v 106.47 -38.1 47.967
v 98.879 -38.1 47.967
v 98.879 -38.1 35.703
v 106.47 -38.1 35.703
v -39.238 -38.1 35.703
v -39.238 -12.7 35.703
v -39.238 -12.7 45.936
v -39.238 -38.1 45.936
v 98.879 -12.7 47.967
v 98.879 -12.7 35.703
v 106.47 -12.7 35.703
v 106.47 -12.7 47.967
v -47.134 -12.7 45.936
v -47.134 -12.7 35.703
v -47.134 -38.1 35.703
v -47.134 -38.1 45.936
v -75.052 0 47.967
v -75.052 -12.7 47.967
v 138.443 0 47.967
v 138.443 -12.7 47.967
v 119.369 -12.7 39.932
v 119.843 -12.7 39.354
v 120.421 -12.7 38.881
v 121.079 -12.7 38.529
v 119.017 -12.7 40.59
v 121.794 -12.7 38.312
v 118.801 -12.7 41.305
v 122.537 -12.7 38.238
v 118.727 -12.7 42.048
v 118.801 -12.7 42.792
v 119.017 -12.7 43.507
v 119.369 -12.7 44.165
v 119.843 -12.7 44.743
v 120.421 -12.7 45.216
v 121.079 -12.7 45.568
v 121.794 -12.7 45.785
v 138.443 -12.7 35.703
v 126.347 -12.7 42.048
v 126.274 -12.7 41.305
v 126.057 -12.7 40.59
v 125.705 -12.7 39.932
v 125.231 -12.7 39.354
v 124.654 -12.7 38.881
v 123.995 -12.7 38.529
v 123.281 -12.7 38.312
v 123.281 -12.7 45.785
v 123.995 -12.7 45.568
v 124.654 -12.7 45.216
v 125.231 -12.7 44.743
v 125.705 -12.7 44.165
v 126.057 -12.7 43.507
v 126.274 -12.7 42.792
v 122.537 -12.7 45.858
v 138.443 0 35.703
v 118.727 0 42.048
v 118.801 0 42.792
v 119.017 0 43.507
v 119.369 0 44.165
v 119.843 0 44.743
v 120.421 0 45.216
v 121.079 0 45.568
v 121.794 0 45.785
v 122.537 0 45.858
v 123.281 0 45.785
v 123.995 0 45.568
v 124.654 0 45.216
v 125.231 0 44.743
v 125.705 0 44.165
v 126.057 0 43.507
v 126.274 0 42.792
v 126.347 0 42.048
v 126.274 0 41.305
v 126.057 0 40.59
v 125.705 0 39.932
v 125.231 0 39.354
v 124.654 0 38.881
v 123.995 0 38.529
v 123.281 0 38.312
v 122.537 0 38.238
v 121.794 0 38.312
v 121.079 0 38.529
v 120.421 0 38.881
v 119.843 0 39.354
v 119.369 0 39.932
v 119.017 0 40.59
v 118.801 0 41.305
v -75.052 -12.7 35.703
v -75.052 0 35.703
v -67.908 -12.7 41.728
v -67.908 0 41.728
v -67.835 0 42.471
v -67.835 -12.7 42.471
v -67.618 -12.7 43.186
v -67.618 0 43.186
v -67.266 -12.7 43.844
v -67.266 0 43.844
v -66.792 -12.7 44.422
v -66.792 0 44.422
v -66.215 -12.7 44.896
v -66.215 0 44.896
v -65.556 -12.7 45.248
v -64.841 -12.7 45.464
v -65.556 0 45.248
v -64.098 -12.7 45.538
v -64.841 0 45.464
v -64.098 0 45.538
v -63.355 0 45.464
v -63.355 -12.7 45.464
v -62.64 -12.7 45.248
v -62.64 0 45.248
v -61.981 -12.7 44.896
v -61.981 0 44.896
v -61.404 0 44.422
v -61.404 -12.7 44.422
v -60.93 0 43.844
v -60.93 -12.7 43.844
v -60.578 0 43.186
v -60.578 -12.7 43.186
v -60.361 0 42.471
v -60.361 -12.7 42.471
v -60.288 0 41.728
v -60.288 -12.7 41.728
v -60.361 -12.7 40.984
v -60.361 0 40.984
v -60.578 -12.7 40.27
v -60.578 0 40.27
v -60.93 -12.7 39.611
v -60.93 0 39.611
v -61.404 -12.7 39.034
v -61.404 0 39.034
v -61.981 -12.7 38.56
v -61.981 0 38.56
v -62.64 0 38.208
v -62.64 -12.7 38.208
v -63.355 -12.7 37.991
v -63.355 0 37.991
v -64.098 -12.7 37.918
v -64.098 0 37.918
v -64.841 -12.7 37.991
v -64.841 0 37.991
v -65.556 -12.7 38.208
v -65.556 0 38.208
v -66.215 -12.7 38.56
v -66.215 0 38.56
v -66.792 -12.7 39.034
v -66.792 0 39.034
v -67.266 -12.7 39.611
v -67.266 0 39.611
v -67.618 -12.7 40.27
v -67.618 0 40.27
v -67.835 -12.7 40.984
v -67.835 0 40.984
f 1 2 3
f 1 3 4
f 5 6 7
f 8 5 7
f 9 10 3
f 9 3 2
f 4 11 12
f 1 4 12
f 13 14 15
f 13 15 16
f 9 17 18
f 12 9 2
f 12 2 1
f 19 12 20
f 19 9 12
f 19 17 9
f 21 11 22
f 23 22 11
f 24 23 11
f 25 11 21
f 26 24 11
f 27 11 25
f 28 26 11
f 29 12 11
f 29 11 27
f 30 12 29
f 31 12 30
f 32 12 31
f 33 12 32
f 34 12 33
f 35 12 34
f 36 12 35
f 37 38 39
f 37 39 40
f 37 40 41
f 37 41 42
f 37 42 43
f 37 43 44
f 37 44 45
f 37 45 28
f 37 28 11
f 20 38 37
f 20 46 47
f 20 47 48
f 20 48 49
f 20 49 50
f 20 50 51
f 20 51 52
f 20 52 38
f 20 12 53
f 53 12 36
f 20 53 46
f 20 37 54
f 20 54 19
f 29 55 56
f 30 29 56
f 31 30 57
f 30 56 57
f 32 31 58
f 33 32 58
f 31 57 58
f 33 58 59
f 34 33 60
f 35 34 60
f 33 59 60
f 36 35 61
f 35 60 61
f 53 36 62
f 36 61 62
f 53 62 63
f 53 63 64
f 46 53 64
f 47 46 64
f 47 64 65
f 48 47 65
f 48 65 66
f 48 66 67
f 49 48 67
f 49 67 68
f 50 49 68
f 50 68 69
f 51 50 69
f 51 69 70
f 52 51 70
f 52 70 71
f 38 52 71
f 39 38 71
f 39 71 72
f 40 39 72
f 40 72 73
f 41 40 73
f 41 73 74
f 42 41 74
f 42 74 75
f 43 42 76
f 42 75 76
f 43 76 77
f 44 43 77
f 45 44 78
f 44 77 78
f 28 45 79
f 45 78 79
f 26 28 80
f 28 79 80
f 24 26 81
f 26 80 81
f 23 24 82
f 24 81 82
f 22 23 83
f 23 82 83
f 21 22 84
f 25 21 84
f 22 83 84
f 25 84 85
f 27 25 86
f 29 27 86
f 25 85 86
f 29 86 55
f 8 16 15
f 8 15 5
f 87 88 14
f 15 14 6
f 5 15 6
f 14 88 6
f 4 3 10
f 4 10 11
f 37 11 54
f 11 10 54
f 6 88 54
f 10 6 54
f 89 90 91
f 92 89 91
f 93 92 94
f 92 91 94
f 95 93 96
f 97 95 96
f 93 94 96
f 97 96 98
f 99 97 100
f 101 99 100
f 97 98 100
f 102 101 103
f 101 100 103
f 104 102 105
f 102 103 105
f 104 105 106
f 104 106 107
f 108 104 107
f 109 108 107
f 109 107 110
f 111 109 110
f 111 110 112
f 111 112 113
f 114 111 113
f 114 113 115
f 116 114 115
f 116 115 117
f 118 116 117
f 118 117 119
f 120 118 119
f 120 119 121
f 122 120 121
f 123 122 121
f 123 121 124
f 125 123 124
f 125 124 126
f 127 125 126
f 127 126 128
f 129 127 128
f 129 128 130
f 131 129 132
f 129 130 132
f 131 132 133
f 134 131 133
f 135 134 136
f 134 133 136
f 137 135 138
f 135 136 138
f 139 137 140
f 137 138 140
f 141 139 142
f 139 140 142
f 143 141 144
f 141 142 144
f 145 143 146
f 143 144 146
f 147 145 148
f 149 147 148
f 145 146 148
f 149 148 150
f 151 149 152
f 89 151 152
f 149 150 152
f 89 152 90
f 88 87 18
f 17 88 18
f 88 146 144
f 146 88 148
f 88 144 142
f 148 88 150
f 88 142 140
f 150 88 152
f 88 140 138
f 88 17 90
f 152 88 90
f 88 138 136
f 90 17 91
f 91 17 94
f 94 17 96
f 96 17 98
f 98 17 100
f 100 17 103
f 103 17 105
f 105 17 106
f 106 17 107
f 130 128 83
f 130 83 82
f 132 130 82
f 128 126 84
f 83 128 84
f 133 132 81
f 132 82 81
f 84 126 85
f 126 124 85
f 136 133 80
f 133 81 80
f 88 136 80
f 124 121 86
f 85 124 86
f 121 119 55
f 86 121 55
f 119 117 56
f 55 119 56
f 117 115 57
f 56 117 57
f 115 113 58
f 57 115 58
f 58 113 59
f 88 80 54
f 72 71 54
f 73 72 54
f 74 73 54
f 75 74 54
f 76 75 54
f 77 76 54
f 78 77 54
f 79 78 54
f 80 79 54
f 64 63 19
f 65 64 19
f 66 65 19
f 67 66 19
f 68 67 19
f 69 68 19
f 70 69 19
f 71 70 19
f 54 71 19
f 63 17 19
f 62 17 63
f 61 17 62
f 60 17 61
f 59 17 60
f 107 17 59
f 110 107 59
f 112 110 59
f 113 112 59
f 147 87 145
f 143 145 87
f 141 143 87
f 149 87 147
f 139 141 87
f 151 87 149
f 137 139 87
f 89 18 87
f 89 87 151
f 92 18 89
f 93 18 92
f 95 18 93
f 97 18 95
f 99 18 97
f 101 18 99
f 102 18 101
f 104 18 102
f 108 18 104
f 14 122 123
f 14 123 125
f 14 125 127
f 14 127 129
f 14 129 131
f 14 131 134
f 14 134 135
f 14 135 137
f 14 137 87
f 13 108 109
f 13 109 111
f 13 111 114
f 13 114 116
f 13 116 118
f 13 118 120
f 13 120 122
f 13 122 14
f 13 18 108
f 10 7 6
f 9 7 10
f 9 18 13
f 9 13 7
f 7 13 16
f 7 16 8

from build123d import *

# Parameters (mm, degrees)
F0_W      = 213.4951800108
F0_H      = 12.2640058398
F1_DEPTH  = 12.7
F3_D      = 7.62
F5_D      = 7.62
F6_W      = 7.8961476684
F6_H      = 5.2659846842
F7_DEPTH  = 25.4
F8_W      = 7.5909867883
F8_H      = 12.2640058398
F9_DEPTH  = 25.4
F10_W     = 7.8961476684
F10_H     = 4.9674399197
F11_DEPTH = 25.4
F12_DEPTH = 12.7


with BuildPart() as f1:
    # F0 (on Front) → F1 (new body)
    with BuildSketch(Plane.XZ):
        with Locations((31.6951796412, 41.8346524239)):
            Rectangle(F0_W, F0_H)
    extrude(amount=F1_DEPTH)

    # F3 (through all)
    with Locations(Plane.XZ.offset(12.7)):
        with Locations((-64.0981197357, 41.7276620865)):
            Hole(F3_D / 2)

    # F5 (through all)
    with Locations(Plane.XZ.offset(12.7)):
        with Locations((122.5372925401, 42.0484915376)):
            Hole(F5_D / 2)

    # F6 (on Front) → F7 (join)
    with BuildSketch(Plane.XZ):
        with Locations((-43.1862734258, 43.3030817658)):
            Rectangle(F6_W, F6_H)
    extrude(amount=F7_DEPTH)

    # F8 (on face) → F9 (join)
    with BuildSketch(Plane.XZ.offset(12.7)):
        with Locations((102.6745773852, 41.8346524239)):
            Rectangle(F8_W, F8_H)
    extrude(amount=F9_DEPTH)

    # F10 (on face) → F11 (join)
    with BuildSketch(Plane.XZ.offset(12.7)):
        with Locations((-43.1862734258, 38.1863694638)):
            Rectangle(F10_W, F10_H)
    extrude(amount=F11_DEPTH)

    # F12 (add): a face of the model
    f12_faces = [f1.faces().sort_by_distance(p)[0] for p in [
        (-43.1862734258, -25.4, 43.3030817658),
    ]]
    extrude(f12_faces, amount=F12_DEPTH)


solid = f1.part
